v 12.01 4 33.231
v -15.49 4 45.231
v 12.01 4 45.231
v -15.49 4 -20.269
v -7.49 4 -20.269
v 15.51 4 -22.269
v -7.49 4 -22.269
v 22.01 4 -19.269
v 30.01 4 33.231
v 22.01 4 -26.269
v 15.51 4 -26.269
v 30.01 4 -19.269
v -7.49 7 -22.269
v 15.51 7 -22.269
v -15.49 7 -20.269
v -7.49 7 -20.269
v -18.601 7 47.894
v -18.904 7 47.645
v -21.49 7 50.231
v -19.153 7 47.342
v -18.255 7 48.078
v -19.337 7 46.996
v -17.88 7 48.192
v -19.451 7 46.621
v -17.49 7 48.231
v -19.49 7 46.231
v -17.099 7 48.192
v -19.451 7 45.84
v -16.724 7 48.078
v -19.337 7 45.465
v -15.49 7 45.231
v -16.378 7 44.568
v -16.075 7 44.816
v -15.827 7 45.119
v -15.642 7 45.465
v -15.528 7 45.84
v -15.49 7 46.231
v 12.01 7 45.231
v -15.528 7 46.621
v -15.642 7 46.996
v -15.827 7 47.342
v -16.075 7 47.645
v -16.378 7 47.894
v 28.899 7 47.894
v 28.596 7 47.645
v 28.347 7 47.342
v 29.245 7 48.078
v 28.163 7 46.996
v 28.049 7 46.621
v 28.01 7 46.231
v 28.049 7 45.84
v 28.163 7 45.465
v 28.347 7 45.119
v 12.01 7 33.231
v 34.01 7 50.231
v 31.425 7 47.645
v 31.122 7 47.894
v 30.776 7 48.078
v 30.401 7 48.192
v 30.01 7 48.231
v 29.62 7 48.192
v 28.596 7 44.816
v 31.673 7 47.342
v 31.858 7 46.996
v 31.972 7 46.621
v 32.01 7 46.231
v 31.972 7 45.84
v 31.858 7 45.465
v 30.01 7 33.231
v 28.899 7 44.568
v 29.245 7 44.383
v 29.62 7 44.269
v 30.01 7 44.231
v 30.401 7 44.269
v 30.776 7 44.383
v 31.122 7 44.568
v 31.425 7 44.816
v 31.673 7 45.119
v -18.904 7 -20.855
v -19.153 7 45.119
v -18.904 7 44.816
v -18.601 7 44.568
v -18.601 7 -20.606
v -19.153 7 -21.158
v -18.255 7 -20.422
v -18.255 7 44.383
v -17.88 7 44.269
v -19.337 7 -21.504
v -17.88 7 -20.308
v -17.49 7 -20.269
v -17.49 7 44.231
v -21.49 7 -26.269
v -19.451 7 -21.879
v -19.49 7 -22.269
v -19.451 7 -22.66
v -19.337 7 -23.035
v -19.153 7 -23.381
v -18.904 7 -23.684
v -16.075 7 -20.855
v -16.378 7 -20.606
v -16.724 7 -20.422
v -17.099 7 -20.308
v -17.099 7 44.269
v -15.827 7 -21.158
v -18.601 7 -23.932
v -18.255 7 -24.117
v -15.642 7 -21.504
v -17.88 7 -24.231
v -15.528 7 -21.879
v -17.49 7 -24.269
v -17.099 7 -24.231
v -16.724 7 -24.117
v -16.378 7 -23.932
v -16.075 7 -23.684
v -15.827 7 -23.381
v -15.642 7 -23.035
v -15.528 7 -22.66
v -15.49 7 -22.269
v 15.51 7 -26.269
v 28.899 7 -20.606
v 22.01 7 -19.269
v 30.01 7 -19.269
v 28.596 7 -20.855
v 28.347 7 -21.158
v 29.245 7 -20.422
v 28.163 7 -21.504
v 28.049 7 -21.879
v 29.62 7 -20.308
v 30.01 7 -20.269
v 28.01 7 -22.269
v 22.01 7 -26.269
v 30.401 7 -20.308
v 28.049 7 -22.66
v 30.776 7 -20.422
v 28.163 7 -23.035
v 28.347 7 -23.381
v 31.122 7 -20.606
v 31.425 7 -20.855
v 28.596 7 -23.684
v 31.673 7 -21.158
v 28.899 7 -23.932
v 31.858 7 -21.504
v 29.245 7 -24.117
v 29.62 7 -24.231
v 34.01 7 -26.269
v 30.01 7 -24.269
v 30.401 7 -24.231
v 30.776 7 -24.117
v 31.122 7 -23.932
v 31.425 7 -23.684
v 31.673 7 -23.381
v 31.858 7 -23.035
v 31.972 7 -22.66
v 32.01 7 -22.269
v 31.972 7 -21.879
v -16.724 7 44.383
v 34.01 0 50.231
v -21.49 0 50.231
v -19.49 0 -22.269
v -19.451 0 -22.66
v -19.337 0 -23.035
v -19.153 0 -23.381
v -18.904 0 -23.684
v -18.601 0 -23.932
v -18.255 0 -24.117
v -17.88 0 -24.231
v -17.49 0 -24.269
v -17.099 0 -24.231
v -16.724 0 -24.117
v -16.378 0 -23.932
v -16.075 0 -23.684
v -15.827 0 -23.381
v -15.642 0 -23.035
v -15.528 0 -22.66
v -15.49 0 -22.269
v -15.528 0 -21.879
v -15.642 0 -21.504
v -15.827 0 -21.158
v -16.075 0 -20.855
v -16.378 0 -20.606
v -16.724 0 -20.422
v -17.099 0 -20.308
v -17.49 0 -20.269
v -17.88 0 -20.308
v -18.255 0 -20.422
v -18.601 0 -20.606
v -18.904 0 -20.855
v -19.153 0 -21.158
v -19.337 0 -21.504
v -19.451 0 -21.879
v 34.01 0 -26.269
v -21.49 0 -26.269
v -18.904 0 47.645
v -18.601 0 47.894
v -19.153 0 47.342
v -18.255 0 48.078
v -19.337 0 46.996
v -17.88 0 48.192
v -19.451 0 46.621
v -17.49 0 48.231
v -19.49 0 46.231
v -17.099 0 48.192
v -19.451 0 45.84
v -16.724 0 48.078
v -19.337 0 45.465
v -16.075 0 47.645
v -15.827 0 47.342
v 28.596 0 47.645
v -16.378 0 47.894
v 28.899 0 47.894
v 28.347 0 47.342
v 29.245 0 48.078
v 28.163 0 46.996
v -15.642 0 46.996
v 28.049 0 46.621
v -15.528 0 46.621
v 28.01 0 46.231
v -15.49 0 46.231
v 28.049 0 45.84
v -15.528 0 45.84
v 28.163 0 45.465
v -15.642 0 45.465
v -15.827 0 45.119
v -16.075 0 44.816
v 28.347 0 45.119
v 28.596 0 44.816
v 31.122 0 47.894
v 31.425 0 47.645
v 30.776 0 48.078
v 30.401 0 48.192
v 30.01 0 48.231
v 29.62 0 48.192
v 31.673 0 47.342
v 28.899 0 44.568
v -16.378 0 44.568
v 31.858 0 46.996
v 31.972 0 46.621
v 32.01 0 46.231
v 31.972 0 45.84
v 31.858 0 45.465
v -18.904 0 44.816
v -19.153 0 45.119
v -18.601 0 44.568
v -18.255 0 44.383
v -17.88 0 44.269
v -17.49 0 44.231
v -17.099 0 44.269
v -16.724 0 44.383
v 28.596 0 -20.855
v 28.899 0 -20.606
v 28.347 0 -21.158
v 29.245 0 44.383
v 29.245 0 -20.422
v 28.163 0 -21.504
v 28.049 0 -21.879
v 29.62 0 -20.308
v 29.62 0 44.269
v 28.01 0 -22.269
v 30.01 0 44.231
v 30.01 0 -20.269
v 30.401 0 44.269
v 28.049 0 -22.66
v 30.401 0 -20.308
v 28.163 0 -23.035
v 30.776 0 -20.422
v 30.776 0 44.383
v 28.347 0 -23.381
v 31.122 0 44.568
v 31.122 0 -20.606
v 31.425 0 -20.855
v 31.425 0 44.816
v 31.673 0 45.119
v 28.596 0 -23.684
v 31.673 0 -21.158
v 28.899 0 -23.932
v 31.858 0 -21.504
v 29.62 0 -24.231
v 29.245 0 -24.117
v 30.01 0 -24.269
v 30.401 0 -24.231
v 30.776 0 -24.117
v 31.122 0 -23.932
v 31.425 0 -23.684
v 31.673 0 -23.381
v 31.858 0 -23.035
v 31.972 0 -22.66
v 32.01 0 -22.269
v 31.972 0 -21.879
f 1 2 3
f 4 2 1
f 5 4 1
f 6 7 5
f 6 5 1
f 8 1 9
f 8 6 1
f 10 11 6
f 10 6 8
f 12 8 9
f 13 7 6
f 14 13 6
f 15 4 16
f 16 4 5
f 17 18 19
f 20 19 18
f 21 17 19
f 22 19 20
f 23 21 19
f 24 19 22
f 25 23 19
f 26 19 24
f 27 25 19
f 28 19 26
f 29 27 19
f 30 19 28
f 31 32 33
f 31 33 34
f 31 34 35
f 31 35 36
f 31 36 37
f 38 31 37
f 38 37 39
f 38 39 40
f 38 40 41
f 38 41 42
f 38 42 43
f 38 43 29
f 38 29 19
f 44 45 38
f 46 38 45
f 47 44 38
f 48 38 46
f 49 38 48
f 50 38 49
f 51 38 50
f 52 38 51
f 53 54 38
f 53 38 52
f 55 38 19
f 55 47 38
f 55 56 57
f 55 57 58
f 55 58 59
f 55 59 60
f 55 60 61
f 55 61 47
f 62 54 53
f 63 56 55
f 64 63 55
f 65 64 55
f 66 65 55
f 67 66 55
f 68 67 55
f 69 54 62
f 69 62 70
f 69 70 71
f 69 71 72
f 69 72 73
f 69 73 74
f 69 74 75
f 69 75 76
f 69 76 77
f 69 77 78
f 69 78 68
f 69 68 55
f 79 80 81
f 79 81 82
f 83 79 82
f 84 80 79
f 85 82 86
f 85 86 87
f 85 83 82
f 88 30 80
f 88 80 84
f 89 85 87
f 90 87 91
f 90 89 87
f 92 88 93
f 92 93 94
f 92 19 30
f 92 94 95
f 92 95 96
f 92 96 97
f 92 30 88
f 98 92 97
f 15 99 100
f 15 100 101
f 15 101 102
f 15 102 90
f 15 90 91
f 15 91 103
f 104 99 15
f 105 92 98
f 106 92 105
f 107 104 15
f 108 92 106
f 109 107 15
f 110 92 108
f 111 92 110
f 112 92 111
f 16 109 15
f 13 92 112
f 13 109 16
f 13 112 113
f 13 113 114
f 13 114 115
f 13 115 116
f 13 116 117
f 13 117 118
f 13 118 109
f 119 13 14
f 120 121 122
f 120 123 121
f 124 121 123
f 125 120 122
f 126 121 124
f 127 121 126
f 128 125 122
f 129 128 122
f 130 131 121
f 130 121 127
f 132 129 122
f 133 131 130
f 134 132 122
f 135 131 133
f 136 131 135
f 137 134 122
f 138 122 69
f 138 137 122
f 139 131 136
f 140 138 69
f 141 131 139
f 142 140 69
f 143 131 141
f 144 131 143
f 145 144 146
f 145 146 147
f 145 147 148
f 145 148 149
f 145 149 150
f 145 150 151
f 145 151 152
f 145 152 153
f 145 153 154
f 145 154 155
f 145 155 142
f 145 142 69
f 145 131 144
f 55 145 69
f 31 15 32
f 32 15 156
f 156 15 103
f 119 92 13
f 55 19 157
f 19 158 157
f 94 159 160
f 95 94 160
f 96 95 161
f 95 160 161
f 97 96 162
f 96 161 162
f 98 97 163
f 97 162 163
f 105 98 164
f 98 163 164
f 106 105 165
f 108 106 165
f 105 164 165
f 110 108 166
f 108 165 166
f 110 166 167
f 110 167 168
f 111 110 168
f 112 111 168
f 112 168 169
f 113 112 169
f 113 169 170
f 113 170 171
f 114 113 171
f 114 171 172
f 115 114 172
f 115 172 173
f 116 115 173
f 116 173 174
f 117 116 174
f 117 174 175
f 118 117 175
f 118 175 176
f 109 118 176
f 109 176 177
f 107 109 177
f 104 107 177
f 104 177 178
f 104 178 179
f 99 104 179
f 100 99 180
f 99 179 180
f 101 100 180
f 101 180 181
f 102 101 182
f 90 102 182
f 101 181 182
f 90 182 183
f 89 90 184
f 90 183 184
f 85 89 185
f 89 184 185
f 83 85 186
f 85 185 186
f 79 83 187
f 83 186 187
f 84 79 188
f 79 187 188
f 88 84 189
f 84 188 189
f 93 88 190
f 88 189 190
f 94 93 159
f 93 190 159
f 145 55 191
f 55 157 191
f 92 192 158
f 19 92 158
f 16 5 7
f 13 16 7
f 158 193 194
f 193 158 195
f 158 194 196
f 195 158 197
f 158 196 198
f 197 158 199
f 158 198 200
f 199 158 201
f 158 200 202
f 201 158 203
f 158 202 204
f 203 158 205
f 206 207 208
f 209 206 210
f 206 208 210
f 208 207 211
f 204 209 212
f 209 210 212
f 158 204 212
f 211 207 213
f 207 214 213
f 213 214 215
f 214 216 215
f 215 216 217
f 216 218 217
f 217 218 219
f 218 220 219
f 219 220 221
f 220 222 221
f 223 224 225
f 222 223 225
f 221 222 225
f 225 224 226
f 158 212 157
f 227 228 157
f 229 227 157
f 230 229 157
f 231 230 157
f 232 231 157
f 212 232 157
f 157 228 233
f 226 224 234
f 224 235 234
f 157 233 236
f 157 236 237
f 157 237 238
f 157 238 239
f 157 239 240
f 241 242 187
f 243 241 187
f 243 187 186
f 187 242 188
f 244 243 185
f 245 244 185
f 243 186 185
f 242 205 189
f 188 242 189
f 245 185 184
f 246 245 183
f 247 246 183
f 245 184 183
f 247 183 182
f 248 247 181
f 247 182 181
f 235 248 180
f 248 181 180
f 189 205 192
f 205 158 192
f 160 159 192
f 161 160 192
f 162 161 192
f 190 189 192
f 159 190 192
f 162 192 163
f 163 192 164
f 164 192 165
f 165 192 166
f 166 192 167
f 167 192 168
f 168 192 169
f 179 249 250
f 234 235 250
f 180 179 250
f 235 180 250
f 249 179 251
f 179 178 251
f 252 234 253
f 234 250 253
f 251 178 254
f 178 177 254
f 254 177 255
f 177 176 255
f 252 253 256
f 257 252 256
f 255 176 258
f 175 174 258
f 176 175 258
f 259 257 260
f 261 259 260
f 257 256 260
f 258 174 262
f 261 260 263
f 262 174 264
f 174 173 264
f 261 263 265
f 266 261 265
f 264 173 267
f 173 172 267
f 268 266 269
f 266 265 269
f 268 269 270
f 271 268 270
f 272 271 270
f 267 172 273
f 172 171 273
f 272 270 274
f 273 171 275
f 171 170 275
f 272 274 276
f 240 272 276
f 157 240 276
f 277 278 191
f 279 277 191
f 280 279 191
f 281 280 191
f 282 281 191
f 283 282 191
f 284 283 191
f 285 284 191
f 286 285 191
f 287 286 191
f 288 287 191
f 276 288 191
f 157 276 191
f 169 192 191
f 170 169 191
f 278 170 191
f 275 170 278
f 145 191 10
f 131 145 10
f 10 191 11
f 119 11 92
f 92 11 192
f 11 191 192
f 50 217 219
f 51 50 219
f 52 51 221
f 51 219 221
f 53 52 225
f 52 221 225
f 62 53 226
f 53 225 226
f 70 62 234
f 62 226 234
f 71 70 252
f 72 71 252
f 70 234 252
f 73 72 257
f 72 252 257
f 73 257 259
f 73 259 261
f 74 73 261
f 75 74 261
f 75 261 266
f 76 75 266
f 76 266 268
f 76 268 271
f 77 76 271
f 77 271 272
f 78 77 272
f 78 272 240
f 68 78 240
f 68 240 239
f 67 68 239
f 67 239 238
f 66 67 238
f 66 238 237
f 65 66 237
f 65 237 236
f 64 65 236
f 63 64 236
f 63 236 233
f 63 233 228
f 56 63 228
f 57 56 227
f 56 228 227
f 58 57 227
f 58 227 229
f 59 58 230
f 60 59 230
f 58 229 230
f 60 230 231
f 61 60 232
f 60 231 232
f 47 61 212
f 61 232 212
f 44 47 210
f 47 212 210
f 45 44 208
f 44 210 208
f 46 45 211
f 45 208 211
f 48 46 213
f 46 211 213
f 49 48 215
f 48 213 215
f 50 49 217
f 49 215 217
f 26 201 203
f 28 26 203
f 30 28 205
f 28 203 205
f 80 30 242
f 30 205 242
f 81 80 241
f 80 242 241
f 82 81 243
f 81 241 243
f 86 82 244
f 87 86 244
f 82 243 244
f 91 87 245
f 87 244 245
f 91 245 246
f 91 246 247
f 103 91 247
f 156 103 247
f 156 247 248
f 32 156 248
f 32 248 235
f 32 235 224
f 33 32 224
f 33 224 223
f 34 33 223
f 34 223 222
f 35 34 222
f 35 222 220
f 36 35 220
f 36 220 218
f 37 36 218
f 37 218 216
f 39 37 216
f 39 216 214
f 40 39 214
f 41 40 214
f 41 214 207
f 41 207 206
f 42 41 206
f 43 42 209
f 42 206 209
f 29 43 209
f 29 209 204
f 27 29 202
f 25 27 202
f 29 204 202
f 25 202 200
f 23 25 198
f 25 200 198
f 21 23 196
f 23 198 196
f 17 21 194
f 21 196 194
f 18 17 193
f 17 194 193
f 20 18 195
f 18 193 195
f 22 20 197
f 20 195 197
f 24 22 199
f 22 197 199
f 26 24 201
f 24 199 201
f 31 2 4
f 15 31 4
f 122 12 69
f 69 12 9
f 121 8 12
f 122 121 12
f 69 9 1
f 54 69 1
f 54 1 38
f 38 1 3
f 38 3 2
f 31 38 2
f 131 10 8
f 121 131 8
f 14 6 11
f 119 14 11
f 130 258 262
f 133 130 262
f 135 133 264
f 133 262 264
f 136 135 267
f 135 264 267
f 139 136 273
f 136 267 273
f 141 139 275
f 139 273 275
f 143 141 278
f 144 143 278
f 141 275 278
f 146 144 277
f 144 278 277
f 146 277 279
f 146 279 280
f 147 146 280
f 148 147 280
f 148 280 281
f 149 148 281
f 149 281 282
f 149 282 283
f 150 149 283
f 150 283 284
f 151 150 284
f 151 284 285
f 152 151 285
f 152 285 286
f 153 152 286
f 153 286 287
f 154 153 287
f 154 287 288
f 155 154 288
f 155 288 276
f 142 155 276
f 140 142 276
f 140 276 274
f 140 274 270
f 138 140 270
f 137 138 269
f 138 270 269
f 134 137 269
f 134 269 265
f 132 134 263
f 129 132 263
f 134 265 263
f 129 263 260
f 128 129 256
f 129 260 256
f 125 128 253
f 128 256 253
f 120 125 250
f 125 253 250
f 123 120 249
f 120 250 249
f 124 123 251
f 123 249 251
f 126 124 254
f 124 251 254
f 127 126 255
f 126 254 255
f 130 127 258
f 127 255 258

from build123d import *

# Parameters (mm, degrees)
SKETCH1_W                    = 55.5
SKETCH1_H                    = 76.5
BOSS_EXTRUDE1_DEPTH          = 4
BOSS_EXTRUDE2_DEPTH          = 3
F_4_0_4_DIAMETER_HOLE1_D     = 4
F_4_0_4_DIAMETER_HOLE1_DEPTH = 7


with BuildPart() as part:
    # Sketch1 → Boss-Extrude1 (new body)
    with BuildSketch(Plane(origin=(0, 0, 0), x_dir=(1, 0, 0), z_dir=(0, 1, 0))):
        with Locations((6.260396975, -11.980623819)):
            Rectangle(SKETCH1_W, SKETCH1_H)
    extrude(amount=BOSS_EXTRUDE1_DEPTH)

    # Sketch2 → Boss-Extrude2 (add)
    with BuildSketch(Plane(origin=(0, 4, 0), x_dir=(1, 0, 0), z_dir=(0, 1, 0))):
        Polygon((-21.489603025, 26.269376181), (-21.489603025, -50.230623819), (34.010396975, -50.230623819), (34.010396975, 26.269376181), (22.010396975, 26.269376181), (22.010396975, 19.269376181), (30.010396975, 19.269376181), (30.010396975, -33.230623819), (12.010396975, -33.230623819), (12.010396975, -45.230623819), (-15.489603025, -45.230623819), (-15.489603025, 20.269376181), (-7.489603025, 20.269376181), (-7.489603025, 22.269376181), (15.510396975, 22.269376181), (15.510396975, 26.269376181), align=None)
    extrude(amount=BOSS_EXTRUDE2_DEPTH)

    # Ø4.0 (4) Diameter Hole1
    with Locations(Plane(origin=(0, 7, 0), x_dir=(1, 0, 0), z_dir=(0, 1, 0))):
        with Locations((30.010396975, 22.269376181), (30.010396975, -46.230623819), (-17.489603025, -46.230623819), (-17.489603025, 22.269376181)):
            Hole(F_4_0_4_DIAMETER_HOLE1_D / 2, depth=F_4_0_4_DIAMETER_HOLE1_DEPTH)


solid = part.part
